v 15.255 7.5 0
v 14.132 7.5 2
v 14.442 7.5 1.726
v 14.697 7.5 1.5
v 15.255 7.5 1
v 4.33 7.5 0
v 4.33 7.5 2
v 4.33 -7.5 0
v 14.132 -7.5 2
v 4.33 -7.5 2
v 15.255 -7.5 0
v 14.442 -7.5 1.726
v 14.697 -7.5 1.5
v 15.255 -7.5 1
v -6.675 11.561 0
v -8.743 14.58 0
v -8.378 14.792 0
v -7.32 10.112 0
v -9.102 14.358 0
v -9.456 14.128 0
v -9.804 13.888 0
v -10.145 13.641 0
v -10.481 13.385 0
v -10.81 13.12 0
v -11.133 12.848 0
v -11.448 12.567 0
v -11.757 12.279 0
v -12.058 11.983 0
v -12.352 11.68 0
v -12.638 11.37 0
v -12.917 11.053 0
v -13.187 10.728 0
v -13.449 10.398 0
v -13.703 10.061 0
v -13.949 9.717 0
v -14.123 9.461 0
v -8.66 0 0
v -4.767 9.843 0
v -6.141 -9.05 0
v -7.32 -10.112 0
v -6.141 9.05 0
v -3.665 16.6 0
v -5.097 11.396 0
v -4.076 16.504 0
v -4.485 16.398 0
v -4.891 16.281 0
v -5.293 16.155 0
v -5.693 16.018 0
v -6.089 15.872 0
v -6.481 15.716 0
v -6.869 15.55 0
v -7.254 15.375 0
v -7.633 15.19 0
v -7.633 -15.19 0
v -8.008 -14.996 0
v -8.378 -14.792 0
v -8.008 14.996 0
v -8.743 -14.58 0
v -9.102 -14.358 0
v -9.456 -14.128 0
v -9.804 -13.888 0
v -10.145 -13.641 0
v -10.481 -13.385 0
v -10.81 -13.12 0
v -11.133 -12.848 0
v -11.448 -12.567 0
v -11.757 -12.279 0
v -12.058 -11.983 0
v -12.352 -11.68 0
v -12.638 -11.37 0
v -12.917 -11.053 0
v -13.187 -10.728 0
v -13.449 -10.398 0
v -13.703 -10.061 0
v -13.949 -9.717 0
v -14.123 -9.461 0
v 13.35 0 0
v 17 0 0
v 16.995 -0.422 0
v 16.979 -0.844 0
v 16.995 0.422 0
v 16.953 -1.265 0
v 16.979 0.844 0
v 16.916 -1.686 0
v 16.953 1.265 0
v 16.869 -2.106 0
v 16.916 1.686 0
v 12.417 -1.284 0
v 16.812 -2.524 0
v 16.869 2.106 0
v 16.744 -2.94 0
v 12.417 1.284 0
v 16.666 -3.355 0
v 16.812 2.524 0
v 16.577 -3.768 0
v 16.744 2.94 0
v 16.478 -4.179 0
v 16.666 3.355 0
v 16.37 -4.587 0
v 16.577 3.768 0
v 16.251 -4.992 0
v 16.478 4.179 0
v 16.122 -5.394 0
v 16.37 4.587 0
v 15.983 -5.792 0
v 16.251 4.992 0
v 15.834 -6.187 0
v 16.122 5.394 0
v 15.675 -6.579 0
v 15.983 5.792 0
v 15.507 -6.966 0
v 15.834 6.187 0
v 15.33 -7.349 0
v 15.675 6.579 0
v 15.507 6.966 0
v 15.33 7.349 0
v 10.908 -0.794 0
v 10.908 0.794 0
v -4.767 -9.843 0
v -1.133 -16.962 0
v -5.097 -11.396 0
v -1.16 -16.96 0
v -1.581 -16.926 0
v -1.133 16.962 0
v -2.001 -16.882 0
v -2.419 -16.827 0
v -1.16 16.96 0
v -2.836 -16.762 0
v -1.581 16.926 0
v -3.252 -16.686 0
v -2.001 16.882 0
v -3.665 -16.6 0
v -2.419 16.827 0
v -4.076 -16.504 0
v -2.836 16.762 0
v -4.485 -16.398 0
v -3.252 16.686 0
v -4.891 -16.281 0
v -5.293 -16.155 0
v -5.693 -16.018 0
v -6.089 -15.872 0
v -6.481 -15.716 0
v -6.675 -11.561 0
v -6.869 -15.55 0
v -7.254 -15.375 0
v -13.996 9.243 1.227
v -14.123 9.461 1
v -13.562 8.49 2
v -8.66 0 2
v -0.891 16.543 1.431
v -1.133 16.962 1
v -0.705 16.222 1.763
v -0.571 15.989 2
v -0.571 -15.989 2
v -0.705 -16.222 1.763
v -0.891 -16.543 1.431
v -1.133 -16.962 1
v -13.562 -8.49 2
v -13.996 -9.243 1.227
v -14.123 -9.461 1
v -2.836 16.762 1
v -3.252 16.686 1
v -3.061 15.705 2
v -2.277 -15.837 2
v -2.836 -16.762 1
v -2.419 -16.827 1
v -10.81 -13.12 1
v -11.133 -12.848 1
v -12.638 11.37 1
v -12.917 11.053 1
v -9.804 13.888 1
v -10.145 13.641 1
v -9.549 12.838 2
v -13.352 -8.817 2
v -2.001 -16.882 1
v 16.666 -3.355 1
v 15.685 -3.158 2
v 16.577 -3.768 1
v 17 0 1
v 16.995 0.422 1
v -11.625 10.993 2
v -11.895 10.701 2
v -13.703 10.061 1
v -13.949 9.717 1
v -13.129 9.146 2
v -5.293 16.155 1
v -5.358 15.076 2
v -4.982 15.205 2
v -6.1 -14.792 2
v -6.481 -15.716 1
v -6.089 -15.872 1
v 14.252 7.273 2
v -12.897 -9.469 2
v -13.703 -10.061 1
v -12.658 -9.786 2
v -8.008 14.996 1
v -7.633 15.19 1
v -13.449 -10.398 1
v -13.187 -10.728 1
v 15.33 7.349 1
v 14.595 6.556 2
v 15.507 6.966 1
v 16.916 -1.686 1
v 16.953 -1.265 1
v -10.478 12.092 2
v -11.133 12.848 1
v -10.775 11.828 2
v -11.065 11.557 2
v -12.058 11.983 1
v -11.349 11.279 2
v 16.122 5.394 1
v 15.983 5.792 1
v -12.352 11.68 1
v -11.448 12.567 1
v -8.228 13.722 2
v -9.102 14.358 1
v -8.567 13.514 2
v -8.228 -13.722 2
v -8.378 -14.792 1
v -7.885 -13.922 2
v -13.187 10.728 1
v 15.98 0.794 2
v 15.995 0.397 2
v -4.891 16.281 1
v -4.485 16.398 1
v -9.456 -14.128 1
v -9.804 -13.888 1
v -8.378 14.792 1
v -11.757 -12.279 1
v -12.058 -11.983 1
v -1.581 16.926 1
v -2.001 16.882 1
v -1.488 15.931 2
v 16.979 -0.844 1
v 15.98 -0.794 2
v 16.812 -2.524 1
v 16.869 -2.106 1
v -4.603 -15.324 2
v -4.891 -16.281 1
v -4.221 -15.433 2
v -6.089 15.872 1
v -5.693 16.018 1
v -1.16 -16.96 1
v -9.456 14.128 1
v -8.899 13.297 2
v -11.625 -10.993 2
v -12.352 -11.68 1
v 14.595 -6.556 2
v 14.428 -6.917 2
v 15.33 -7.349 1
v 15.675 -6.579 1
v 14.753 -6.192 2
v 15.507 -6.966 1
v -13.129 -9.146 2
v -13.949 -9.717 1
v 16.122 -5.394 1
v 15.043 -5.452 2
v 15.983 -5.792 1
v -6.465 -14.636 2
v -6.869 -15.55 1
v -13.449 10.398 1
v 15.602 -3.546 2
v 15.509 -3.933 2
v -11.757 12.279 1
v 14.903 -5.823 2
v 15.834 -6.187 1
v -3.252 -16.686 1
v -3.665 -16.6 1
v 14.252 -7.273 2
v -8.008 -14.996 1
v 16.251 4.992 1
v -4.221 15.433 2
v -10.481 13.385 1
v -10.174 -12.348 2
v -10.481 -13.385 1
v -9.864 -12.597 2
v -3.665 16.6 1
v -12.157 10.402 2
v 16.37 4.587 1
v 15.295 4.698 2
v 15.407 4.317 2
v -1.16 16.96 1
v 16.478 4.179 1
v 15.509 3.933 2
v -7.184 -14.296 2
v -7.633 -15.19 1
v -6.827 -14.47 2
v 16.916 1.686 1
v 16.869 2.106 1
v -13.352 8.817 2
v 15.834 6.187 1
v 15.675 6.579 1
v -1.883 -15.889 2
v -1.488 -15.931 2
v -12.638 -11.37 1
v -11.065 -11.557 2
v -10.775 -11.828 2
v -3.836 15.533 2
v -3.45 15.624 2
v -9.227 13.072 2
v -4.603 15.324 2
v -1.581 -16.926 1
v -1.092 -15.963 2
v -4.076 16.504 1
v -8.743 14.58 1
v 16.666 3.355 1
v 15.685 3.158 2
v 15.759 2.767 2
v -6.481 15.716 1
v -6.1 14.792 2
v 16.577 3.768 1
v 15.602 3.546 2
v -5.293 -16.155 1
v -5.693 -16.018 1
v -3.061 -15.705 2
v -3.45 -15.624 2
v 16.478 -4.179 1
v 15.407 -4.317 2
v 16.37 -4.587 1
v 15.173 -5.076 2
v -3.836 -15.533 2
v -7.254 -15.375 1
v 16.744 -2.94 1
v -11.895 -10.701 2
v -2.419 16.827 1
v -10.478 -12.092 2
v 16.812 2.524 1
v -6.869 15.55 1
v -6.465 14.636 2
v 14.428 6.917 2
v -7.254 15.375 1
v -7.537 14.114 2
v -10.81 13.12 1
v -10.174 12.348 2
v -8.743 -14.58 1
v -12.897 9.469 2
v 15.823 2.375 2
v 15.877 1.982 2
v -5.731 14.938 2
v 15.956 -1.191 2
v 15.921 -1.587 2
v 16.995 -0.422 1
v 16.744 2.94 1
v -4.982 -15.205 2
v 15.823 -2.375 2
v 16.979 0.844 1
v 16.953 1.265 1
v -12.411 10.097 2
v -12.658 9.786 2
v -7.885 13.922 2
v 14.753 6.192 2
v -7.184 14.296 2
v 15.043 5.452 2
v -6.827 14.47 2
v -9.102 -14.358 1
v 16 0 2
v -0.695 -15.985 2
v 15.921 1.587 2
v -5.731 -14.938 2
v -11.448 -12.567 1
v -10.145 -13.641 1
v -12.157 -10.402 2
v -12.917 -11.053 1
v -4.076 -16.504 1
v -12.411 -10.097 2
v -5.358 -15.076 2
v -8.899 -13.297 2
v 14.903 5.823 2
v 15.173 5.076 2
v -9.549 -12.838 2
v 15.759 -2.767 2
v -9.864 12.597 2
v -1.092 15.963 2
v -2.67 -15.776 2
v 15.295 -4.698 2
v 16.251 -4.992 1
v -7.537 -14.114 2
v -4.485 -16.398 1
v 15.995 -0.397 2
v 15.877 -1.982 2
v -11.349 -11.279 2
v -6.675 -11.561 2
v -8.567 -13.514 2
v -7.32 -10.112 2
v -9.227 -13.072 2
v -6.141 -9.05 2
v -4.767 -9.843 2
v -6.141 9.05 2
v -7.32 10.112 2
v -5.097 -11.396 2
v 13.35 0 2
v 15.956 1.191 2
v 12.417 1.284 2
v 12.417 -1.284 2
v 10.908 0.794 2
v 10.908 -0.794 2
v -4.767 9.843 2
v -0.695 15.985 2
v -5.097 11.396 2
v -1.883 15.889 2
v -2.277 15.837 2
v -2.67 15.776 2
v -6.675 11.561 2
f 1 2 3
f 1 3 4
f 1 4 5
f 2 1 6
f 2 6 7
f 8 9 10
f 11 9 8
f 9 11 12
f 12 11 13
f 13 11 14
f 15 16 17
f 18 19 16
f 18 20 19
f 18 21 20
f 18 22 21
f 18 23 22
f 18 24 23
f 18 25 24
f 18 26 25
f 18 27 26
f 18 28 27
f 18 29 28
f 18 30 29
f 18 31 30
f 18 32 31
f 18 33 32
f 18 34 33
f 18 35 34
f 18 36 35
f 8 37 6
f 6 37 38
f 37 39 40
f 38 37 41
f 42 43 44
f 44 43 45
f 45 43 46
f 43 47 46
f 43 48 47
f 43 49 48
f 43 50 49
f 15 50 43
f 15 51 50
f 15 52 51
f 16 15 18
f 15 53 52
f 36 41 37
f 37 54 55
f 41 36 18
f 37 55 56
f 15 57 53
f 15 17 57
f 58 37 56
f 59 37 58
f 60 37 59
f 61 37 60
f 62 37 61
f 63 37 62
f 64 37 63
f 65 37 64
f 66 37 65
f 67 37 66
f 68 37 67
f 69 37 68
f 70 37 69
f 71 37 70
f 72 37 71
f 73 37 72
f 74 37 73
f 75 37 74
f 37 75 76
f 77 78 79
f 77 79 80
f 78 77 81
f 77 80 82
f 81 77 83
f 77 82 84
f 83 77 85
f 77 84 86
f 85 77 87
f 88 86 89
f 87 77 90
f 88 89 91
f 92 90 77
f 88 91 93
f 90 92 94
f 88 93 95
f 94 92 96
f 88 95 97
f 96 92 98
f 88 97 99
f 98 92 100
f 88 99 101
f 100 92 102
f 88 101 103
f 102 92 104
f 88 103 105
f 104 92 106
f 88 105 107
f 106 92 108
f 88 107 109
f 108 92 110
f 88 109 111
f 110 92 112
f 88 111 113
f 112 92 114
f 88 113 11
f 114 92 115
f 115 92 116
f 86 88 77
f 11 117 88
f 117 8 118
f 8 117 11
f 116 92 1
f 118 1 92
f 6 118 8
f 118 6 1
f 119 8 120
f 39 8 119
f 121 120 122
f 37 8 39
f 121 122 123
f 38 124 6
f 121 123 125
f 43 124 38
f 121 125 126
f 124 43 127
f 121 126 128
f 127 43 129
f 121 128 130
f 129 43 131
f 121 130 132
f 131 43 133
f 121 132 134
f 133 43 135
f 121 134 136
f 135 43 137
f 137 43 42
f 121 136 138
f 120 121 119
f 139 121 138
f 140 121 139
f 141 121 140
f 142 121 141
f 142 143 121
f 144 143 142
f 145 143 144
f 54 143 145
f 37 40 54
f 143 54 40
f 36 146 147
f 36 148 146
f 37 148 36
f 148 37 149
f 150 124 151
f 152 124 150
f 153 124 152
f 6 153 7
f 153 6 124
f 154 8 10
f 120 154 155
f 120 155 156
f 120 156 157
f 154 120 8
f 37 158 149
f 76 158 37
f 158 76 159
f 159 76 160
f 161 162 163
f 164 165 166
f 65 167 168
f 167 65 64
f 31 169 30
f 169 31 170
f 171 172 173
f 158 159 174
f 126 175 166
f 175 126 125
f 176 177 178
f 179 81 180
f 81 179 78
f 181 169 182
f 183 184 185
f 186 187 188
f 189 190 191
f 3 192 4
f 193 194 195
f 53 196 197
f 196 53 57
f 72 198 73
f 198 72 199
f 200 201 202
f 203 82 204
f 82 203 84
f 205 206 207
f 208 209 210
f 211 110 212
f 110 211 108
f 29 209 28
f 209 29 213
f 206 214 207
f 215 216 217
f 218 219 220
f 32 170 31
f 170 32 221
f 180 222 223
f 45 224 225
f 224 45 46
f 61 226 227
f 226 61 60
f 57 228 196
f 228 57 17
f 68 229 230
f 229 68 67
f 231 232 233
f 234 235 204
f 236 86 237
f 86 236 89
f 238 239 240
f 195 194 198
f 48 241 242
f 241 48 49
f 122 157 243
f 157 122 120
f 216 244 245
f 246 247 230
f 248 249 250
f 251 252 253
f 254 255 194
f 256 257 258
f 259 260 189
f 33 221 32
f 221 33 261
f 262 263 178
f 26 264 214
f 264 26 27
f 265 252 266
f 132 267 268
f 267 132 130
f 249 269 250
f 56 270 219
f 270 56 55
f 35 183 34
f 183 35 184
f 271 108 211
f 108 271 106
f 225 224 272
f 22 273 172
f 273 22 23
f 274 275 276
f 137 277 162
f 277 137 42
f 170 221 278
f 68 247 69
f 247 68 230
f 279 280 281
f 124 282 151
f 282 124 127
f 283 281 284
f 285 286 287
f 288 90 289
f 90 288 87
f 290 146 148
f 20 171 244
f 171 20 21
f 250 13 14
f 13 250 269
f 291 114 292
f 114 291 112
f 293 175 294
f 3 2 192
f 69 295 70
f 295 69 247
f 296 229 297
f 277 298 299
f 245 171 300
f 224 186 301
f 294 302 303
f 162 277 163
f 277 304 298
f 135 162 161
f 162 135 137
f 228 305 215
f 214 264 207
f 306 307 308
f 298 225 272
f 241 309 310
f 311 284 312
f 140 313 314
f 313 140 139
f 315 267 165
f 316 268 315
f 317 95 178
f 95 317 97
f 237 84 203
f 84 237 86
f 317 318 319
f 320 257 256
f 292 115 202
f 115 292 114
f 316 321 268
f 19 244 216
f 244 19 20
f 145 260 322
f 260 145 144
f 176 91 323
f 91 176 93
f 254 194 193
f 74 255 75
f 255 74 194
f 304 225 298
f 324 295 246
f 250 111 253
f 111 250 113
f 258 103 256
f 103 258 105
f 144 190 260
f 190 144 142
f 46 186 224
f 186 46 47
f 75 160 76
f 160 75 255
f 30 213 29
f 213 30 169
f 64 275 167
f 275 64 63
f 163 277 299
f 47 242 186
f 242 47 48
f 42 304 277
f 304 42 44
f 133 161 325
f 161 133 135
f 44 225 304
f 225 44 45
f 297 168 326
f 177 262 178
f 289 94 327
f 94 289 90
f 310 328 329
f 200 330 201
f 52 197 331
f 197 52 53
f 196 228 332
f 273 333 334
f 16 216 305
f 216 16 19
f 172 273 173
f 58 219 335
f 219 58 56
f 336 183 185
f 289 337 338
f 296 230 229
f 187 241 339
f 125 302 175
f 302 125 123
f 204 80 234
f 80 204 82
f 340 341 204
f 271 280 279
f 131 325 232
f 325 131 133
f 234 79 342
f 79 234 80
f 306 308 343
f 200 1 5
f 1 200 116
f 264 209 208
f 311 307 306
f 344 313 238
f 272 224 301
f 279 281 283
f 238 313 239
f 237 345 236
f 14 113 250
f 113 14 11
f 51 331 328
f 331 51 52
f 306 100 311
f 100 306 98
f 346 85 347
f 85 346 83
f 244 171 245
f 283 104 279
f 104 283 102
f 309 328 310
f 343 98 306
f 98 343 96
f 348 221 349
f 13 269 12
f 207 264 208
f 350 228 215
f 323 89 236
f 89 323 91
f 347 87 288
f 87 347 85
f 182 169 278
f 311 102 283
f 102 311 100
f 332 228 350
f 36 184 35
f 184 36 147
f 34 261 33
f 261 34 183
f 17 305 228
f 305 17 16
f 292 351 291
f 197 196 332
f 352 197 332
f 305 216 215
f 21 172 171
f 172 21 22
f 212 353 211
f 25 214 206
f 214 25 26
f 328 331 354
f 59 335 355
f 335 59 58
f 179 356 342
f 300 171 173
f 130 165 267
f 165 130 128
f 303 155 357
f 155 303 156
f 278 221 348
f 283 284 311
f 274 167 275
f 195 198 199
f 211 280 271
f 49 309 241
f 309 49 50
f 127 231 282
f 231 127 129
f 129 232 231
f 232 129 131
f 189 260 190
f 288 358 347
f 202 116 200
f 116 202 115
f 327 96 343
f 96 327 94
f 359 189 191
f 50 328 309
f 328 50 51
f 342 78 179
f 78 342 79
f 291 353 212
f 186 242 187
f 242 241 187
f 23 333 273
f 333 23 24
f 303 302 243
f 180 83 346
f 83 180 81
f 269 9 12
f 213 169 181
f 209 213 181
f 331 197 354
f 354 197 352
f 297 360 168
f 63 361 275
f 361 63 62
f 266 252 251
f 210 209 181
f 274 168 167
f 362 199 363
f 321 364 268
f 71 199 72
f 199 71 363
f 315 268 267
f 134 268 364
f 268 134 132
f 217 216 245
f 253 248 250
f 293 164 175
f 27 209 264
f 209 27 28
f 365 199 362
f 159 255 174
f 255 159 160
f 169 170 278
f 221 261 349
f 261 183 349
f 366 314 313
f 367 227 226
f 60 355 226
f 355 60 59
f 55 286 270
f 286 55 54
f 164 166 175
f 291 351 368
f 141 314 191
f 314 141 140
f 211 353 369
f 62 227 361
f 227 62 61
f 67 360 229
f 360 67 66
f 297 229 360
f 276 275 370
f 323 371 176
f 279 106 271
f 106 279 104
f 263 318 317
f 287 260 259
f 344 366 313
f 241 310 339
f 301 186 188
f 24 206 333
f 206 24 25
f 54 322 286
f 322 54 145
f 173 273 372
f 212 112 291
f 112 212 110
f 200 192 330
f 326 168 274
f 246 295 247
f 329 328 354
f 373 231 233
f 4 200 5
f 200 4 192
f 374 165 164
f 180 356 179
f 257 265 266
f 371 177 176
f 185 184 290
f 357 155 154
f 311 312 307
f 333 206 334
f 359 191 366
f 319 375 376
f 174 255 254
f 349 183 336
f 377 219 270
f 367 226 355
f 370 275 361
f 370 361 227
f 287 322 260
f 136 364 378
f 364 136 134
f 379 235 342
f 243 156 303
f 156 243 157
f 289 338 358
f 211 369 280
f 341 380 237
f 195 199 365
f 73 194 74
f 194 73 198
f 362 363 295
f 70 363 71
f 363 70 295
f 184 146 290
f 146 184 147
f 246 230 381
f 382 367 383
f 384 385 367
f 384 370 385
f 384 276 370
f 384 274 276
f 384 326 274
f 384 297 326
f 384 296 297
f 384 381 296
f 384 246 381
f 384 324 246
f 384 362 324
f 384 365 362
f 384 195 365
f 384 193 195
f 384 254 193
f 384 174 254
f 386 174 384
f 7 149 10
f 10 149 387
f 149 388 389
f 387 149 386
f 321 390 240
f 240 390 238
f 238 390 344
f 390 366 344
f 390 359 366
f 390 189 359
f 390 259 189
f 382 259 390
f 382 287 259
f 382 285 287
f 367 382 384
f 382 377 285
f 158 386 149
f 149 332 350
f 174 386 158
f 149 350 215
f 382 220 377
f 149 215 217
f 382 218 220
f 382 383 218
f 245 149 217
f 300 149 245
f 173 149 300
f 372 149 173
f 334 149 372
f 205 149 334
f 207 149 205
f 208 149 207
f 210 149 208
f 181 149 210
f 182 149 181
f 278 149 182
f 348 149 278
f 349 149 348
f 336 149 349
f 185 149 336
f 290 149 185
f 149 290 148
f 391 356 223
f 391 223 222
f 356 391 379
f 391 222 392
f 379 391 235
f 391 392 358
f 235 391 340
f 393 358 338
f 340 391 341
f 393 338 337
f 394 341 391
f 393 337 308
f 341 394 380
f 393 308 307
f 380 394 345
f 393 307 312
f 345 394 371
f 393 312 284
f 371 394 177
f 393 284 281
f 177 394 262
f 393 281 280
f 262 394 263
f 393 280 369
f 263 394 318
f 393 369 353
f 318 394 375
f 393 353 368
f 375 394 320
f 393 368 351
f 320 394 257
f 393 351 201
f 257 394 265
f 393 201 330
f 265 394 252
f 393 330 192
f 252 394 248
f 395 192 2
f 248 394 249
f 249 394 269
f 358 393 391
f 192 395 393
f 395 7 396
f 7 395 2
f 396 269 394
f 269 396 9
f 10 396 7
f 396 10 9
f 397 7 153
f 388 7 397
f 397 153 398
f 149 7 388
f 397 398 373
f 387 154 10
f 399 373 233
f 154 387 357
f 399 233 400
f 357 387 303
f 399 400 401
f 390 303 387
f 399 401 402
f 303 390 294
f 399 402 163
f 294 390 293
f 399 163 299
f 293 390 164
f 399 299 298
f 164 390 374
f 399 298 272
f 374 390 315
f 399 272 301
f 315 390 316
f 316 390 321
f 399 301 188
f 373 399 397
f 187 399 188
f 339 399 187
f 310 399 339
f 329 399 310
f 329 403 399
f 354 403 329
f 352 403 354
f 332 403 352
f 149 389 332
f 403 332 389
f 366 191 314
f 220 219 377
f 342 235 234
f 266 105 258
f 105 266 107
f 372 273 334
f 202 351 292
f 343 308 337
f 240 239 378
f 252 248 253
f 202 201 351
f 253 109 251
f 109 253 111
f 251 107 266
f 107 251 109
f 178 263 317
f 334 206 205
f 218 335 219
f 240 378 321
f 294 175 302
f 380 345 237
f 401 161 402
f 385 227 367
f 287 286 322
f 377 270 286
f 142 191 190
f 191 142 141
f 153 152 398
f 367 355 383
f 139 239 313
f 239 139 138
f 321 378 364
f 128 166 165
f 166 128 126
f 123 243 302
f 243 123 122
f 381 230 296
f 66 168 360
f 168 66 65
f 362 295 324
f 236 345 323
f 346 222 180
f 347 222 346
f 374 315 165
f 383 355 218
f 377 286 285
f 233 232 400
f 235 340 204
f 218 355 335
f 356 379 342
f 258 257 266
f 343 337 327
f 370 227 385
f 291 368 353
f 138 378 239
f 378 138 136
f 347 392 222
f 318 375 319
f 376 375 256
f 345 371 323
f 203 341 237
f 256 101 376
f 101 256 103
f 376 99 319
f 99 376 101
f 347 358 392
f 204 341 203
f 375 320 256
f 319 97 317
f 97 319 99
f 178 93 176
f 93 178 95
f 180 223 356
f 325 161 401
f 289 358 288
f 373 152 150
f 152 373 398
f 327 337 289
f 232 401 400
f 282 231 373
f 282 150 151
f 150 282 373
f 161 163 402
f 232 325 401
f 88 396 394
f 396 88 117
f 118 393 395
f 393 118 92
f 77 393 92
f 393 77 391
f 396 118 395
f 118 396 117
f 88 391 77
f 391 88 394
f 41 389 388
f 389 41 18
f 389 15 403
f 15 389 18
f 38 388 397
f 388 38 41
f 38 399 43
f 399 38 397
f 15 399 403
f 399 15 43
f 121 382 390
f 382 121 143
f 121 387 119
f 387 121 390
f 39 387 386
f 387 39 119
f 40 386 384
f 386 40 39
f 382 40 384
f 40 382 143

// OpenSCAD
// file: coupler.scad
use <Chamfers-for-OpenSCAD/Chamfer.scad>
use <threads-scad/threads.scad>

magnet_diameter=6.2;
magnet_height=3.5;
distance_to_wall=0.5;

// max_magnet_height=5; simply scale height, till they fit inside
// design is currently built to fit max diameter of 8mm magnets
max_magnet_diameter=8;
assert(magnet_diameter<max_magnet_diameter, "Design accomadates magnets up to a diameter of 8mm");
min_wall_thickness=1;

// pneumatic fitting (default PC4-M6(?))
thread_diameter=6;
thread_height=4.5;

filament_throughhole_size=3;

// TODO: increase magnet size for easy insertion
module magnet(diameter=magnet_diameter, height=magnet_height) {
    cylinder(h=height,r=diameter/2);
}

distance_magnets_center=10;
module magnets() {
    for (i=[0:2]) {
        rotate([0,0,i*120]) translate([distance_magnets_center,0,distance_to_wall]) magnet();
    }
}

base_height = magnet_height+distance_to_wall+min_wall_thickness;
// account for thread height, if magnet smaller thread height
height = (thread_height > magnet_height) ? base_height - magnet_height + thread_height : base_height;

h=height;
r=(max_magnet_diameter+min_wall_thickness*2)/2;
module c(i) {
    rotate([0,0,i*120]) translate([distance_magnets_center,0,0]) chamferCylinder(h=h,r=r,ch=0,ch2=1.5);
}
module e(i) {
    rotate([0,0,i*120+60]) translate([distance_magnets_center/4,0,0]) chamferCylinder(h=h,r=r,ch=0,ch2=1.5);
}
module outline() {
    hull() {
        c(0);
        e(0);
        e(2);
    }
    hull() {
        c(1);
        e(1);
        e(0);
    }
    hull() {
        c(2);
        e(2);
        e(1);
    }
}

module filament_throughhole() {
    translate([0,0,-10]) cylinder(h=100,filament_throughhole_size/2);
}

module shape() {
    difference() {
        outline();
        filament_throughhole();
    }
}

module coupler(magnets=true) {
    difference() {
        ScrewHole(outer_diam=thread_diameter, height=thread_height, position=[0,0,height], rotation=[0,180,0], pitch=0, tooth_angle=30, tolerance=0.4, tooth_height=0) shape();
        if (magnets) {
            magnets();
        }
    }
}

//$fn=128;
//coupler();
// file: socket.scad
include <coupler.scad>

distance_wall=1;
recess=1;
screwhole_diameter=3;
screw_recess=3;
screw_recess_diameter=6;
socket_seating_tolerance=1.02;

socket_diameter=40;
// $fn=16;

module reducer() {
    for (i=[0:2]) {
        hull() {
            strength=15;
            rotate([0,0,i*120]) cylinder(h=100,r=strength/2);
            rotate([0,0,i*120]) translate([socket_diameter,0,0]) cylinder(h=100,r=strength/2);
        }
    }
}

socket_height=distance_to_wall+magnet_height+distance_wall+recess;
module socket_body() {
    difference() {
        // ScrewHole(outer_diam=socket_diameter, height=socket_height, position=[0,0,0], rotation=[0,0,0], pitch=2, tooth_angle=30, tolerance=0.4, tooth_height=0) cylinder(h=socket_height,r=socket_diameter/2);
        intersection() {
            ScrewThread(outer_diam=socket_diameter, height=socket_height, pitch=2, tooth_angle=30, tolerance=0.4, tip_height=0, tooth_height=0, tip_min_fract=0) cylinder(h=socket_height,r=socket_diameter/2);
            reducer();
        }
        
        scale([socket_seating_tolerance,socket_seating_tolerance,1]) translate([0,0,socket_height-recess]) union() {
            coupler(magnets=false);
            cylinder(h=100,r=5); // gets rid of the artifact of the threads
        }
    }
}

module screw_holes(diameter=0,screw_recess=0) {
    for (i=[0:2]) {
        rotate([0,0,i*120]) translate([12,0,-5]) cylinder(h=100,r=diameter/2);
        rotate([0,0,i*120]) translate([12,0,socket_height-screw_recess]) cylinder(h=10,r=screw_recess_diameter/2);
    }
}

module socket() {
    difference() {
        socket_body();
        screw_holes(screwhole_diameter,screw_recess);
        filament_throughhole();
    }
}

//socket();
// main file
include <socket.scad>
include <coupler.scad>

// diameter for hole size in counterpiece, allows using/trying to use plastic threads
screw_hole_counterpiece=2.7;
counter_piece_thickness=2;

module counterpiece() {
    difference() {
        intersection() {
            chamferCylinder(h=counter_piece_thickness, r=socket_diameter/2-3, ch=0,ch2=1);
            reducer();
        }
        screw_holes(diameter=screw_hole_counterpiece);
        filament_throughhole();
    }
}
//$fn=128;
counterpiece();
